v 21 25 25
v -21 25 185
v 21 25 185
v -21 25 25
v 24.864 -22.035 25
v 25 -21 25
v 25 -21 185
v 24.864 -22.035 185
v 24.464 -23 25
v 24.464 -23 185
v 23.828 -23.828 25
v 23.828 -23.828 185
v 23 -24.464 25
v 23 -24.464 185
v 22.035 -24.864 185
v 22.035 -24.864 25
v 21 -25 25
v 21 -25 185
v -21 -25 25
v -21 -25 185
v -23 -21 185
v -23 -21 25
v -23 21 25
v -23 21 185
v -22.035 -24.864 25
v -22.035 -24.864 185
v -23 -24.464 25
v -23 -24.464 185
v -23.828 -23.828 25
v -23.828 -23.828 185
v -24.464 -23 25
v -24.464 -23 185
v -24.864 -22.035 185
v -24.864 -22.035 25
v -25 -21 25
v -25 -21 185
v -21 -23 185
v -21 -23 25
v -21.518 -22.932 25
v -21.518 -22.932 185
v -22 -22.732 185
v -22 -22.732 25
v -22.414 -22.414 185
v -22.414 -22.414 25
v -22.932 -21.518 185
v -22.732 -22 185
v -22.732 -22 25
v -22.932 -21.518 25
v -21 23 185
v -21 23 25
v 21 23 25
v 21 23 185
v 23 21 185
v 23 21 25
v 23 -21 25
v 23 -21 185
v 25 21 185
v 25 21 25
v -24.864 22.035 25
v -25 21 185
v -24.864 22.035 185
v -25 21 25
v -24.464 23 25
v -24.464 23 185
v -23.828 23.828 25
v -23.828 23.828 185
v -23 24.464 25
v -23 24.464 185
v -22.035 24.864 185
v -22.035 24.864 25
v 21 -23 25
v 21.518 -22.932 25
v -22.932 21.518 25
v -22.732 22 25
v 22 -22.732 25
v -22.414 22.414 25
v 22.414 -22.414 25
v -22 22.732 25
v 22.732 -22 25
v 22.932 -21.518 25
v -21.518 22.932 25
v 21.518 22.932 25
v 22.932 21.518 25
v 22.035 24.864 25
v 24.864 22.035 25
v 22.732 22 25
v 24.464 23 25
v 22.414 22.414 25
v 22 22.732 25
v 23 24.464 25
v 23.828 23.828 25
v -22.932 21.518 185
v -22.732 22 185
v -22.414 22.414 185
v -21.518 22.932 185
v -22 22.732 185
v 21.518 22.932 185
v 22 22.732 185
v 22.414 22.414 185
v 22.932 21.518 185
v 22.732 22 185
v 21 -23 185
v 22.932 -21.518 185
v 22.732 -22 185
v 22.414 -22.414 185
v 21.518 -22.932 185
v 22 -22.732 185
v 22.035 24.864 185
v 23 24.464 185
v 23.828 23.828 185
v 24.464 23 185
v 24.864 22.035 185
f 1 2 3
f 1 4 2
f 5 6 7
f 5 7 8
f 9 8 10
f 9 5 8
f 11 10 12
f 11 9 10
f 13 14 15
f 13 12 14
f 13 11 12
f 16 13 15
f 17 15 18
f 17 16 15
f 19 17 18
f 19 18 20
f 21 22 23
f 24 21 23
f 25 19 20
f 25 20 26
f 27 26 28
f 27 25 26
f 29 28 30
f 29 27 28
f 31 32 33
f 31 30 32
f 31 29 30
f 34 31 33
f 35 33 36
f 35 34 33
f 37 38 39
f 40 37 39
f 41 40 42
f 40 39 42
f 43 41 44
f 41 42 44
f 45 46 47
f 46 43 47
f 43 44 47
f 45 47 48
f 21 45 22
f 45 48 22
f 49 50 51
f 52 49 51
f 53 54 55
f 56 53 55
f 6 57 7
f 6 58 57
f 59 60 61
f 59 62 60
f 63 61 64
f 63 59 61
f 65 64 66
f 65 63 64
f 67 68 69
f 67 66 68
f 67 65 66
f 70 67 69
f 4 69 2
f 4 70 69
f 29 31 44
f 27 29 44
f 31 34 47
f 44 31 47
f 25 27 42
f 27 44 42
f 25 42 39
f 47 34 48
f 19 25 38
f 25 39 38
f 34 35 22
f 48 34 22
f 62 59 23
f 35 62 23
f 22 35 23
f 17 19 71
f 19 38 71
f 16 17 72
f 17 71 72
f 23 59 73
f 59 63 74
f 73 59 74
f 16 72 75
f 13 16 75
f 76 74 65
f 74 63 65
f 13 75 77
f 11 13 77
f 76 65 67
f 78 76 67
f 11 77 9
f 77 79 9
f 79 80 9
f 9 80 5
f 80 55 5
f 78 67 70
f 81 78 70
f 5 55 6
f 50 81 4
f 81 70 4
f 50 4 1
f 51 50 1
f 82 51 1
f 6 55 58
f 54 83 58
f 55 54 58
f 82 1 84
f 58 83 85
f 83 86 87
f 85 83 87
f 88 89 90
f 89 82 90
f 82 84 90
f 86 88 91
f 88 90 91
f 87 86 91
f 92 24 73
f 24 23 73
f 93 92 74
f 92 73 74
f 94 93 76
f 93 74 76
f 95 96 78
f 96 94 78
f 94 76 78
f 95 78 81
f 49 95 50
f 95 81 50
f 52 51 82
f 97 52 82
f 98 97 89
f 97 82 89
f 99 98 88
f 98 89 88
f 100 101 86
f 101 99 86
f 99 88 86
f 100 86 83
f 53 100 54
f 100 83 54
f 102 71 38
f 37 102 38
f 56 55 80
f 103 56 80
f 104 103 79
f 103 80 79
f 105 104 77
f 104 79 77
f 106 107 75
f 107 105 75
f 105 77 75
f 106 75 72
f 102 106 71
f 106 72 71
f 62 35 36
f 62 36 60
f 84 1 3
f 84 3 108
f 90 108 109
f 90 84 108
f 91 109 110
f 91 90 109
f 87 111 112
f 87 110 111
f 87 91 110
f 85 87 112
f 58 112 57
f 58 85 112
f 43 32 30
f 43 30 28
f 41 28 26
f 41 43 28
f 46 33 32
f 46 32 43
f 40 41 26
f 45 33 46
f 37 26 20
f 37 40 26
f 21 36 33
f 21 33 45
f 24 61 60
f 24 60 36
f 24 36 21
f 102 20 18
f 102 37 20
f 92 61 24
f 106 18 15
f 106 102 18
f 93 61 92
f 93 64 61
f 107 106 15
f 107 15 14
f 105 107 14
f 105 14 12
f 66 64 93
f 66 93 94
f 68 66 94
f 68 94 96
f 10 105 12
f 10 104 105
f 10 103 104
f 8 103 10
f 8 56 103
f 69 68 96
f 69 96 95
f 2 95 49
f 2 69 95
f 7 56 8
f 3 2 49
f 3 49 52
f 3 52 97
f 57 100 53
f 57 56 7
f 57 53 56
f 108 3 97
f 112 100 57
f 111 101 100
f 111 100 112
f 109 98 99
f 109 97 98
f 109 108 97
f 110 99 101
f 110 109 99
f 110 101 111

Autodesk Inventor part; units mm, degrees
ref_plane "Start Plane" through (0, 0, 25) normal (0, 0, 1) x (1, 0, 0)
ref_plane "End Plane" through (0, 0, 185) normal (0, 0, 1) x (1, 0, 0)
sketch "Sketch" plane through (0, 0, 0) normal (0, 0, 1) x (1, 0, 0)
  line L0 (-25, -21) -> (-25, 21)
  line L1 (-21, 25) -> (21, 25)
  line L2 (25, 21) -> (25, -21)
  line L3 (21, -25) -> (-21, -25)
  arc A0 (-25, -21) -> (-21, -25) centre (-21, -21) ccw
  arc A1 (25, 21) -> (21, 25) centre (21, 21) ccw
  arc A2 (-21, 25) -> (-25, 21) centre (-21, 21) ccw
  arc A3 (21, -25) -> (25, -21) centre (21, -21) ccw
  arc A4 (-21, 23) -> (-23, 21) centre (-21, 21) ccw
  line L4 (-21, 23) -> (21, 23)
  arc A5 (23, 21) -> (21, 23) centre (21, 21) ccw
  line L5 (23, 21) -> (23, -21)
  arc A6 (21, -23) -> (23, -21) centre (21, -21) ccw
  line L6 (21, -23) -> (-21, -23)
  arc A7 (-23, -21) -> (-21, -23) centre (-21, -21) ccw
  line L7 (-23, -21) -> (-23, 21)
  line L8 (0, 36.1598) -> (0, -36.1598) construction
  line L9 (-36.1598, 0) -> (36.1598, 0) construction
  dimension "d7" = 4
  dimension "d9" = 50
  dimension "d11" = 50
  dimension "d12" = 2
  dimension "d15" = 25
  dimension "d16" = 25
extrude "Body" add sketch "Sketch" along normal up to surface (160 mm away) from surface at 25
sketch "Sketch3" plane through (0, 0, 0) normal (0, 0, 1) x (1, 0, 0)
  line L0 (0, 0) -> (10, 0)
ref_plane "Work Plane3" through (0, 0, 0) normal (0, -1, 0) x (1, 0, 0)
sketch "Sketch4" plane through (0, 0, 0) normal (0, -1, 0) x (1, 0, 0)
  line L0 (-2, 25) -> (12, 25)
  line L1 (-2, 185) -> (12, 185)
  dimension "d18" = 160
ref_plane "Work Plane4" through (1045, -21, 185) normal (0, 0, 1) x (1, 0, 0)
split "Split1" plane through (1045, -21, 185) removes the side toward (0, 0, 1)
ref_plane "Work Plane5" through (-1270, -21, 25) normal (0, 0, -1) x (-1, 0, 0)
split "Split2" plane through (-1270, -21, 25) removes the side toward (0, 0, -1)
equation "\"d7\" = G_IR"
equation "\"d9\" = G_W"
equation "\"d11\" = G_H"
equation "\"d12\" = G_T"
equation "\"d15\" = 0.5 * d9"
equation "\"d16\" = 0.5 * d11"
equation "\"d3\" = G_L"
equation "\"G_W\" = 50"
equation "\"G_H\" = 50"
equation "\"G_T\" = 2"
equation "\"G_IR\" = 4"
equation "\"G_L\" = d18"
equation "\"G_OFFSET_START\" = -25"
equation "\"G_OFFSET_END\" = -25"
equation "\"d13\" = -G_OFFSET_START"
equation "\"d14\" = G_OFFSET_END + B_L"
equation "\"B_L\" = 210"
properties part number "ISO 10799-2 - 50x50x2 - 160" material "Steel, Galvanized"
